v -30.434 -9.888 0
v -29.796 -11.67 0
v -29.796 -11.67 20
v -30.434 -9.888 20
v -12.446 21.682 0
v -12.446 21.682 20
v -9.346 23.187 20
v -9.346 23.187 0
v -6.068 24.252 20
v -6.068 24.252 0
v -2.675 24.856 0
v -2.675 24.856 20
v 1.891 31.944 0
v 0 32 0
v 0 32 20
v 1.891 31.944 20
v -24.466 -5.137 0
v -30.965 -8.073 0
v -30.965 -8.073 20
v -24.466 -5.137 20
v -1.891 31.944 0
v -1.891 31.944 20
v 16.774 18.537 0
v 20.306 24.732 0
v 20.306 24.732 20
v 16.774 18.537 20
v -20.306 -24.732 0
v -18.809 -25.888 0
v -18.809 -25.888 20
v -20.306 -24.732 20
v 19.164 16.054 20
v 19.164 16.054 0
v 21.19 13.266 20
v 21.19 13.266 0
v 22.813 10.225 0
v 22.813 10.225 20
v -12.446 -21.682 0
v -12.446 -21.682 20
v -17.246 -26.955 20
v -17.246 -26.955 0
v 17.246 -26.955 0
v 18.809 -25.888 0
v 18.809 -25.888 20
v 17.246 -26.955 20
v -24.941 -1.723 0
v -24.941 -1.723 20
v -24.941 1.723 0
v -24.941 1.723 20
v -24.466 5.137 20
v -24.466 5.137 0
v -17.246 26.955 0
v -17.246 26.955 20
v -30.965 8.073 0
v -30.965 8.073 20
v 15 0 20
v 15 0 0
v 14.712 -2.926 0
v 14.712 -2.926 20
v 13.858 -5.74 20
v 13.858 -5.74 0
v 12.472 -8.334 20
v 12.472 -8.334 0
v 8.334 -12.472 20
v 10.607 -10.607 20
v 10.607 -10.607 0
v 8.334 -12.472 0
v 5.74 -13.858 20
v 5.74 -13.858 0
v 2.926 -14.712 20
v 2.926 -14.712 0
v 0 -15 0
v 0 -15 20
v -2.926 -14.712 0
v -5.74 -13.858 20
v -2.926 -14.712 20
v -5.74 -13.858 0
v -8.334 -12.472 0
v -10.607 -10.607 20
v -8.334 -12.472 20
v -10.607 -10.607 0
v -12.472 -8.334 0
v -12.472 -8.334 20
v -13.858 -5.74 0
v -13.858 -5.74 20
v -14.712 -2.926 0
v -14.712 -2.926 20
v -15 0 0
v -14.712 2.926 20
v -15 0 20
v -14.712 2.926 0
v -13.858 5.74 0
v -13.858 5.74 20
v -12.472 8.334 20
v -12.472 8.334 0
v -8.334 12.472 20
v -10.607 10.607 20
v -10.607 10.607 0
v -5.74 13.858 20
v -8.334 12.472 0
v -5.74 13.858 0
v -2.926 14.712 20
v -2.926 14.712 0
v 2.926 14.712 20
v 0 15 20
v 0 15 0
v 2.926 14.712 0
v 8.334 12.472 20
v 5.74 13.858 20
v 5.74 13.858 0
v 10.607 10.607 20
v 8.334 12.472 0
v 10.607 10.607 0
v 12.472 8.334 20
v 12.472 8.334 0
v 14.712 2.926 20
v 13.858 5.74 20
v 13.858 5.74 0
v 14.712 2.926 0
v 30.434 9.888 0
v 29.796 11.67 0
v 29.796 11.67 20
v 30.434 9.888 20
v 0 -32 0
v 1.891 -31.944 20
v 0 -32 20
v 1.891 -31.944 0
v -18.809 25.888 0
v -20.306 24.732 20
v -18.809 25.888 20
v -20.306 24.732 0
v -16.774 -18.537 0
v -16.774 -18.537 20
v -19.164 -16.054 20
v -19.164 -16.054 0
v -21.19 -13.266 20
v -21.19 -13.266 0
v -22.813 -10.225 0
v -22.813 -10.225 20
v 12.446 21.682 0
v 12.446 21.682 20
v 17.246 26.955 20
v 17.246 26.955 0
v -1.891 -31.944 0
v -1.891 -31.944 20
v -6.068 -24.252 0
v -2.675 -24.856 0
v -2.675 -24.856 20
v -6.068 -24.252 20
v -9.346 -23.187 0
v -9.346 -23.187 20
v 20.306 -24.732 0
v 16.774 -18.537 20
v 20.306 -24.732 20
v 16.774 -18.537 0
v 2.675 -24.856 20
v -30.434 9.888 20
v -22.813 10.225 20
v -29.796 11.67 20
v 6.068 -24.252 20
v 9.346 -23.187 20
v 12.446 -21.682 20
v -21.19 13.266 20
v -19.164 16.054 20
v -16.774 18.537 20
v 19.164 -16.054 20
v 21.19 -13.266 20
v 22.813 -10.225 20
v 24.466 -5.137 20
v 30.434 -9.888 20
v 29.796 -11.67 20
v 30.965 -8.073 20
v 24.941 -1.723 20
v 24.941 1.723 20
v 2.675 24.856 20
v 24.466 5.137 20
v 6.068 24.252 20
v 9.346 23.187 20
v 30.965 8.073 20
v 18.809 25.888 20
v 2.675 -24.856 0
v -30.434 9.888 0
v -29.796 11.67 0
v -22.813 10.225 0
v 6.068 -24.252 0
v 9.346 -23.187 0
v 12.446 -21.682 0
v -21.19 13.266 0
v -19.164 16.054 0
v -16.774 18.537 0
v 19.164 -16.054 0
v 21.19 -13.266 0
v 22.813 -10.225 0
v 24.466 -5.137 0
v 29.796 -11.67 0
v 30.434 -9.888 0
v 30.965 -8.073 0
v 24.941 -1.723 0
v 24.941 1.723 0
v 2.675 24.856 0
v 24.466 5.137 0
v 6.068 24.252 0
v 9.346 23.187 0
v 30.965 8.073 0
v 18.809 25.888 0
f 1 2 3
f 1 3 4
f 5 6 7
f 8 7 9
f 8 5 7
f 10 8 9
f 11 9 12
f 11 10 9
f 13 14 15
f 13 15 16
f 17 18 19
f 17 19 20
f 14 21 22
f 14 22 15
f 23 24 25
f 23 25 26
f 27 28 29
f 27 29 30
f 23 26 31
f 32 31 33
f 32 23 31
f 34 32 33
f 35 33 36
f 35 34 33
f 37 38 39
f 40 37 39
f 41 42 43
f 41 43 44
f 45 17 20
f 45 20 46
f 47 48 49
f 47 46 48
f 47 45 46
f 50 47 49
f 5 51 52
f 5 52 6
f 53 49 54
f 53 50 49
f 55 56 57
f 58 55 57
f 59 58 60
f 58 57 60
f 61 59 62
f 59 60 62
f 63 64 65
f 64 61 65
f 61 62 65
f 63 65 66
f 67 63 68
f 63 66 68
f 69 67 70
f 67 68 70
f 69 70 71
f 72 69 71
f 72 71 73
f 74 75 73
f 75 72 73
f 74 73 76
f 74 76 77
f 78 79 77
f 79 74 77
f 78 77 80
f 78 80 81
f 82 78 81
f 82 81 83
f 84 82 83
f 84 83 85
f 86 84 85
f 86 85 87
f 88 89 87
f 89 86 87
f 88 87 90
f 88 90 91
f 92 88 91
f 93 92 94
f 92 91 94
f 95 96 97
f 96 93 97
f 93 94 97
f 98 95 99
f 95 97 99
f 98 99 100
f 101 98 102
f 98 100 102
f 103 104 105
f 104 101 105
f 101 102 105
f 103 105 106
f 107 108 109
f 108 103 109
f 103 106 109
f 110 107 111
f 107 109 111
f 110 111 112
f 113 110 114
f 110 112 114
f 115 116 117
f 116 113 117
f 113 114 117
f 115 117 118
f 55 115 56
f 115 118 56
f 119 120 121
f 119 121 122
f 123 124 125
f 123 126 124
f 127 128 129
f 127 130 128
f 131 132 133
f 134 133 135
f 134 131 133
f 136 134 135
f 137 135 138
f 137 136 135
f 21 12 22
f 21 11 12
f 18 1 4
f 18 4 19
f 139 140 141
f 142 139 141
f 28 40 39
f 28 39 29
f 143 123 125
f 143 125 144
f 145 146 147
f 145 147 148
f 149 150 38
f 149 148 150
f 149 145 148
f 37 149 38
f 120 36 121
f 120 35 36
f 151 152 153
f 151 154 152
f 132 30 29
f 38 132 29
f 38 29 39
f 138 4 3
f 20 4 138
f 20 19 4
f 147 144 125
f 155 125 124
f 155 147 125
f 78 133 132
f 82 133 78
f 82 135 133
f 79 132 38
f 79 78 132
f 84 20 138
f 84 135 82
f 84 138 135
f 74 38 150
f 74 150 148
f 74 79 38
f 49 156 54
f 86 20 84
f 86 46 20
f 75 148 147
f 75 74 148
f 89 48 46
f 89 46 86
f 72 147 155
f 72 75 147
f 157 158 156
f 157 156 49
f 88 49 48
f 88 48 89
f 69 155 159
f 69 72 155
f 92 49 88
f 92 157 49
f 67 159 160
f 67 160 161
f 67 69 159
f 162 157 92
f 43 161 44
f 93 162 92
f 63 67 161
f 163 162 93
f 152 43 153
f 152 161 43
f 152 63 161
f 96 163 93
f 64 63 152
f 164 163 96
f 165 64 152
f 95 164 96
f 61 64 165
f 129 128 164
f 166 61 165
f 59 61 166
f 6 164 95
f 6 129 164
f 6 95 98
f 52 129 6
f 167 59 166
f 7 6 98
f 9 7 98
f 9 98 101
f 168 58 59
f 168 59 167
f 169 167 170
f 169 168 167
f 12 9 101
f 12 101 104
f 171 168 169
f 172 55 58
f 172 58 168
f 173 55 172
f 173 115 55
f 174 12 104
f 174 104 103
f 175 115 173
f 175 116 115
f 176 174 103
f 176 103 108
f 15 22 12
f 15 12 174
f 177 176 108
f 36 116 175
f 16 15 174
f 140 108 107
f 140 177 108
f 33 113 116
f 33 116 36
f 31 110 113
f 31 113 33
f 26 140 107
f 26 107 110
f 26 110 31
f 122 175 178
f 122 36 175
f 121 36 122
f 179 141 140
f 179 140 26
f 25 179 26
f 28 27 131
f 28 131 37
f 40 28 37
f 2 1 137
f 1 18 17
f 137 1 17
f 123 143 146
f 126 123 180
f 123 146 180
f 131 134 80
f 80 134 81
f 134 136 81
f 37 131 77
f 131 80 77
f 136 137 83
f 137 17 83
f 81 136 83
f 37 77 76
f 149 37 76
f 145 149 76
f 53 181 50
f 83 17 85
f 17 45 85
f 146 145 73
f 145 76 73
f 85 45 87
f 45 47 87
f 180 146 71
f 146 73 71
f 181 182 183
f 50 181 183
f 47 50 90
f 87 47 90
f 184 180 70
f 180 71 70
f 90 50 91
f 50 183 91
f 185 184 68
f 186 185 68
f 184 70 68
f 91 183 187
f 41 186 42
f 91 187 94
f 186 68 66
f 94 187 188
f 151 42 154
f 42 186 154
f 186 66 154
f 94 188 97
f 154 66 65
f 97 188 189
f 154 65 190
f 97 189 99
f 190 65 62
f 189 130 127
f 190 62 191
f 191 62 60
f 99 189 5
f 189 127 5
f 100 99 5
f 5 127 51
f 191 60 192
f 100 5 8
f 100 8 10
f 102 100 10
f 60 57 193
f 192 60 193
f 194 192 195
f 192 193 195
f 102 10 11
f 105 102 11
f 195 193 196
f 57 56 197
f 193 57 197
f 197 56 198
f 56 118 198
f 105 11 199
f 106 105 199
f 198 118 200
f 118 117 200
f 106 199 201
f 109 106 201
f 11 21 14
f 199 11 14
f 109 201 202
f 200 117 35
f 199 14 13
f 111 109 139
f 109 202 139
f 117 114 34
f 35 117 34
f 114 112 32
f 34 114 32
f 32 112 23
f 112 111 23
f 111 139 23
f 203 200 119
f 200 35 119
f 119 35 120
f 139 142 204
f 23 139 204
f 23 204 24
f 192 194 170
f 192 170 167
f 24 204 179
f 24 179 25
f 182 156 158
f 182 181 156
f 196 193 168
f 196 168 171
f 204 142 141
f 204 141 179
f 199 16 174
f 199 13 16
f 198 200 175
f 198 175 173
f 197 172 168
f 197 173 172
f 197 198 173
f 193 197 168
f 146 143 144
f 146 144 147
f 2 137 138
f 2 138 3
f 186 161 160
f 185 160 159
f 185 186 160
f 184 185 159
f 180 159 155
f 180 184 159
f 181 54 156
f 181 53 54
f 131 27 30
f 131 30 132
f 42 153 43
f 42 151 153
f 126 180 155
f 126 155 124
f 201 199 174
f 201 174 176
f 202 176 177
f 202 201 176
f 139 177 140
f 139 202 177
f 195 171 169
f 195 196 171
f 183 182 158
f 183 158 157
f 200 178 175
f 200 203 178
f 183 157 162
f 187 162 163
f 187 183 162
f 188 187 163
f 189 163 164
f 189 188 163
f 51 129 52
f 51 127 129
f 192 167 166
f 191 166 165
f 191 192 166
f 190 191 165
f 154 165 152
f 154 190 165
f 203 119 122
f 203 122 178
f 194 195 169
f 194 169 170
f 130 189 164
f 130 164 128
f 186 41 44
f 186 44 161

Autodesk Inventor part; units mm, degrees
ref_plane "YZ Plane" through (0, 0, 0) normal (1, 0, 0) x (0, 1, 0)
ref_plane "XZ Plane" through (0, 0, 0) normal (0, 1, 0) x (-1, 0, 0)
ref_plane "XY Plane" through (0, 0, 0) normal (0, 0, 1) x (1, 0, 0)
sketch "Sketch1" plane through (0, 0, 0) normal (0, 0, 1) x (1, 0, 0)
  circle A0 centre (0, 0) radius 15
  arc A1 (-2.6749, 24.8565) -> (-12.4462, 21.6816) centre (0, 0) ccw
  arc A2 (-16.7743, 18.5371) -> (-22.8133, 10.2251) centre (0, 0) ccw
  arc A3 (12.4462, 21.6816) -> (2.6749, 24.8565) centre (0, 0) ccw
  arc A4 (22.8133, 10.2251) -> (16.7743, 18.5371) centre (0, 0) ccw
  arc A5 (24.4665, -5.1371) -> (24.4665, 5.1371) centre (0, 0) ccw
  arc A6 (16.7743, -18.5371) -> (22.8133, -10.2251) centre (0, 0) ccw
  arc A7 (2.6749, -24.8565) -> (12.4462, -21.6816) centre (0, 0) ccw
  arc A8 (-12.4462, -21.6816) -> (-2.6749, -24.8565) centre (0, 0) ccw
  arc A9 (-22.8133, -10.2251) -> (-16.7743, -18.5371) centre (0, 0) ccw
  arc A10 (-24.4665, 5.1371) -> (-24.4665, -5.1371) centre (0, 0) ccw
  line L0 (-16.7743, 18.5371) -> (-20.306, 24.7319)
  line L1 (-20.306, 24.7319) -> (-18.8091, 25.8885)
  line L2 (-18.8091, 25.8885) -> (-17.2465, 26.9547)
  line L3 (-17.2465, 26.9547) -> (-12.4462, 21.6816)
  line L4 (-24.4665, 5.1371) -> (-30.9649, 8.0729)
  line L5 (-30.9649, 8.0729) -> (-30.4338, 9.8885)
  line L6 (-30.4338, 9.8885) -> (-29.7963, 11.6696)
  line L7 (-29.7963, 11.6696) -> (-22.8133, 10.2251)
  line L8 (-22.8133, -10.2251) -> (-29.7963, -11.6696)
  line L9 (-29.7963, -11.6696) -> (-30.4338, -9.8885)
  line L10 (-30.4338, -9.8885) -> (-30.9649, -8.0729)
  line L11 (-30.9649, -8.0729) -> (-24.4665, -5.1371)
  line L12 (-12.4462, -21.6816) -> (-17.2465, -26.9547)
  line L13 (-17.2465, -26.9547) -> (-18.8091, -25.8885)
  line L14 (-18.8091, -25.8885) -> (-20.306, -24.7319)
  line L15 (-20.306, -24.7319) -> (-16.7743, -18.5371)
  line L16 (2.6749, -24.8565) -> (1.8909, -31.9441)
  line L17 (1.8909, -31.9441) -> (0, -32)
  line L18 (0, -32) -> (-1.8909, -31.9441)
  line L19 (-1.8909, -31.9441) -> (-2.6749, -24.8565)
  line L20 (16.7743, -18.5371) -> (20.306, -24.7319)
  line L21 (20.306, -24.7319) -> (18.8091, -25.8885)
  line L22 (18.8091, -25.8885) -> (17.2465, -26.9547)
  line L23 (17.2465, -26.9547) -> (12.4462, -21.6816)
  line L24 (24.4665, -5.1371) -> (30.9649, -8.0729)
  line L25 (30.9649, -8.0729) -> (30.4338, -9.8885)
  line L26 (30.4338, -9.8885) -> (29.7963, -11.6696)
  line L27 (29.7963, -11.6696) -> (22.8133, -10.2251)
  line L28 (22.8133, 10.2251) -> (29.7963, 11.6696)
  line L29 (29.7963, 11.6696) -> (30.4338, 9.8885)
  line L30 (30.4338, 9.8885) -> (30.9649, 8.0729)
  line L31 (30.9649, 8.0729) -> (24.4665, 5.1371)
  line L32 (12.4462, 21.6816) -> (17.2465, 26.9547)
  line L33 (17.2465, 26.9547) -> (18.8091, 25.8885)
  line L34 (18.8091, 25.8885) -> (20.306, 24.7319)
  line L35 (20.306, 24.7319) -> (16.7743, 18.5371)
  line L36 (-2.6749, 24.8565) -> (-1.8909, 31.9441)
  line L37 (-1.8909, 31.9441) -> (0, 32)
  line L38 (0, 32) -> (1.8909, 31.9441)
  line L39 (1.8909, 31.9441) -> (2.6749, 24.8565)
  point P0 (-2.6749, 24.8565)
  point P1 (-12.4462, 21.6816)
  point P2 (-16.7743, 18.5371)
  point P3 (-22.8133, 10.2251)
  point P4 (-24.4665, -5.1371)
  point P5 (-22.8133, -10.2251)
  point P6 (-16.7743, -18.5371)
  point P7 (-12.4462, -21.6816)
  point P8 (-2.6749, -24.8565)
  point P9 (12.4462, -21.6816)
  point P10 (16.7743, -18.5371)
  point P11 (22.8133, -10.2251)
  point P12 (24.4665, 5.1371)
  point P13 (22.8133, 10.2251)
  point P14 (16.7743, 18.5371)
  point P15 (12.4462, 21.6816)
  point P16 (2.6749, 24.8565)
extrude "Extrusion1" add sketch "Sketch1" along normal blind 20
